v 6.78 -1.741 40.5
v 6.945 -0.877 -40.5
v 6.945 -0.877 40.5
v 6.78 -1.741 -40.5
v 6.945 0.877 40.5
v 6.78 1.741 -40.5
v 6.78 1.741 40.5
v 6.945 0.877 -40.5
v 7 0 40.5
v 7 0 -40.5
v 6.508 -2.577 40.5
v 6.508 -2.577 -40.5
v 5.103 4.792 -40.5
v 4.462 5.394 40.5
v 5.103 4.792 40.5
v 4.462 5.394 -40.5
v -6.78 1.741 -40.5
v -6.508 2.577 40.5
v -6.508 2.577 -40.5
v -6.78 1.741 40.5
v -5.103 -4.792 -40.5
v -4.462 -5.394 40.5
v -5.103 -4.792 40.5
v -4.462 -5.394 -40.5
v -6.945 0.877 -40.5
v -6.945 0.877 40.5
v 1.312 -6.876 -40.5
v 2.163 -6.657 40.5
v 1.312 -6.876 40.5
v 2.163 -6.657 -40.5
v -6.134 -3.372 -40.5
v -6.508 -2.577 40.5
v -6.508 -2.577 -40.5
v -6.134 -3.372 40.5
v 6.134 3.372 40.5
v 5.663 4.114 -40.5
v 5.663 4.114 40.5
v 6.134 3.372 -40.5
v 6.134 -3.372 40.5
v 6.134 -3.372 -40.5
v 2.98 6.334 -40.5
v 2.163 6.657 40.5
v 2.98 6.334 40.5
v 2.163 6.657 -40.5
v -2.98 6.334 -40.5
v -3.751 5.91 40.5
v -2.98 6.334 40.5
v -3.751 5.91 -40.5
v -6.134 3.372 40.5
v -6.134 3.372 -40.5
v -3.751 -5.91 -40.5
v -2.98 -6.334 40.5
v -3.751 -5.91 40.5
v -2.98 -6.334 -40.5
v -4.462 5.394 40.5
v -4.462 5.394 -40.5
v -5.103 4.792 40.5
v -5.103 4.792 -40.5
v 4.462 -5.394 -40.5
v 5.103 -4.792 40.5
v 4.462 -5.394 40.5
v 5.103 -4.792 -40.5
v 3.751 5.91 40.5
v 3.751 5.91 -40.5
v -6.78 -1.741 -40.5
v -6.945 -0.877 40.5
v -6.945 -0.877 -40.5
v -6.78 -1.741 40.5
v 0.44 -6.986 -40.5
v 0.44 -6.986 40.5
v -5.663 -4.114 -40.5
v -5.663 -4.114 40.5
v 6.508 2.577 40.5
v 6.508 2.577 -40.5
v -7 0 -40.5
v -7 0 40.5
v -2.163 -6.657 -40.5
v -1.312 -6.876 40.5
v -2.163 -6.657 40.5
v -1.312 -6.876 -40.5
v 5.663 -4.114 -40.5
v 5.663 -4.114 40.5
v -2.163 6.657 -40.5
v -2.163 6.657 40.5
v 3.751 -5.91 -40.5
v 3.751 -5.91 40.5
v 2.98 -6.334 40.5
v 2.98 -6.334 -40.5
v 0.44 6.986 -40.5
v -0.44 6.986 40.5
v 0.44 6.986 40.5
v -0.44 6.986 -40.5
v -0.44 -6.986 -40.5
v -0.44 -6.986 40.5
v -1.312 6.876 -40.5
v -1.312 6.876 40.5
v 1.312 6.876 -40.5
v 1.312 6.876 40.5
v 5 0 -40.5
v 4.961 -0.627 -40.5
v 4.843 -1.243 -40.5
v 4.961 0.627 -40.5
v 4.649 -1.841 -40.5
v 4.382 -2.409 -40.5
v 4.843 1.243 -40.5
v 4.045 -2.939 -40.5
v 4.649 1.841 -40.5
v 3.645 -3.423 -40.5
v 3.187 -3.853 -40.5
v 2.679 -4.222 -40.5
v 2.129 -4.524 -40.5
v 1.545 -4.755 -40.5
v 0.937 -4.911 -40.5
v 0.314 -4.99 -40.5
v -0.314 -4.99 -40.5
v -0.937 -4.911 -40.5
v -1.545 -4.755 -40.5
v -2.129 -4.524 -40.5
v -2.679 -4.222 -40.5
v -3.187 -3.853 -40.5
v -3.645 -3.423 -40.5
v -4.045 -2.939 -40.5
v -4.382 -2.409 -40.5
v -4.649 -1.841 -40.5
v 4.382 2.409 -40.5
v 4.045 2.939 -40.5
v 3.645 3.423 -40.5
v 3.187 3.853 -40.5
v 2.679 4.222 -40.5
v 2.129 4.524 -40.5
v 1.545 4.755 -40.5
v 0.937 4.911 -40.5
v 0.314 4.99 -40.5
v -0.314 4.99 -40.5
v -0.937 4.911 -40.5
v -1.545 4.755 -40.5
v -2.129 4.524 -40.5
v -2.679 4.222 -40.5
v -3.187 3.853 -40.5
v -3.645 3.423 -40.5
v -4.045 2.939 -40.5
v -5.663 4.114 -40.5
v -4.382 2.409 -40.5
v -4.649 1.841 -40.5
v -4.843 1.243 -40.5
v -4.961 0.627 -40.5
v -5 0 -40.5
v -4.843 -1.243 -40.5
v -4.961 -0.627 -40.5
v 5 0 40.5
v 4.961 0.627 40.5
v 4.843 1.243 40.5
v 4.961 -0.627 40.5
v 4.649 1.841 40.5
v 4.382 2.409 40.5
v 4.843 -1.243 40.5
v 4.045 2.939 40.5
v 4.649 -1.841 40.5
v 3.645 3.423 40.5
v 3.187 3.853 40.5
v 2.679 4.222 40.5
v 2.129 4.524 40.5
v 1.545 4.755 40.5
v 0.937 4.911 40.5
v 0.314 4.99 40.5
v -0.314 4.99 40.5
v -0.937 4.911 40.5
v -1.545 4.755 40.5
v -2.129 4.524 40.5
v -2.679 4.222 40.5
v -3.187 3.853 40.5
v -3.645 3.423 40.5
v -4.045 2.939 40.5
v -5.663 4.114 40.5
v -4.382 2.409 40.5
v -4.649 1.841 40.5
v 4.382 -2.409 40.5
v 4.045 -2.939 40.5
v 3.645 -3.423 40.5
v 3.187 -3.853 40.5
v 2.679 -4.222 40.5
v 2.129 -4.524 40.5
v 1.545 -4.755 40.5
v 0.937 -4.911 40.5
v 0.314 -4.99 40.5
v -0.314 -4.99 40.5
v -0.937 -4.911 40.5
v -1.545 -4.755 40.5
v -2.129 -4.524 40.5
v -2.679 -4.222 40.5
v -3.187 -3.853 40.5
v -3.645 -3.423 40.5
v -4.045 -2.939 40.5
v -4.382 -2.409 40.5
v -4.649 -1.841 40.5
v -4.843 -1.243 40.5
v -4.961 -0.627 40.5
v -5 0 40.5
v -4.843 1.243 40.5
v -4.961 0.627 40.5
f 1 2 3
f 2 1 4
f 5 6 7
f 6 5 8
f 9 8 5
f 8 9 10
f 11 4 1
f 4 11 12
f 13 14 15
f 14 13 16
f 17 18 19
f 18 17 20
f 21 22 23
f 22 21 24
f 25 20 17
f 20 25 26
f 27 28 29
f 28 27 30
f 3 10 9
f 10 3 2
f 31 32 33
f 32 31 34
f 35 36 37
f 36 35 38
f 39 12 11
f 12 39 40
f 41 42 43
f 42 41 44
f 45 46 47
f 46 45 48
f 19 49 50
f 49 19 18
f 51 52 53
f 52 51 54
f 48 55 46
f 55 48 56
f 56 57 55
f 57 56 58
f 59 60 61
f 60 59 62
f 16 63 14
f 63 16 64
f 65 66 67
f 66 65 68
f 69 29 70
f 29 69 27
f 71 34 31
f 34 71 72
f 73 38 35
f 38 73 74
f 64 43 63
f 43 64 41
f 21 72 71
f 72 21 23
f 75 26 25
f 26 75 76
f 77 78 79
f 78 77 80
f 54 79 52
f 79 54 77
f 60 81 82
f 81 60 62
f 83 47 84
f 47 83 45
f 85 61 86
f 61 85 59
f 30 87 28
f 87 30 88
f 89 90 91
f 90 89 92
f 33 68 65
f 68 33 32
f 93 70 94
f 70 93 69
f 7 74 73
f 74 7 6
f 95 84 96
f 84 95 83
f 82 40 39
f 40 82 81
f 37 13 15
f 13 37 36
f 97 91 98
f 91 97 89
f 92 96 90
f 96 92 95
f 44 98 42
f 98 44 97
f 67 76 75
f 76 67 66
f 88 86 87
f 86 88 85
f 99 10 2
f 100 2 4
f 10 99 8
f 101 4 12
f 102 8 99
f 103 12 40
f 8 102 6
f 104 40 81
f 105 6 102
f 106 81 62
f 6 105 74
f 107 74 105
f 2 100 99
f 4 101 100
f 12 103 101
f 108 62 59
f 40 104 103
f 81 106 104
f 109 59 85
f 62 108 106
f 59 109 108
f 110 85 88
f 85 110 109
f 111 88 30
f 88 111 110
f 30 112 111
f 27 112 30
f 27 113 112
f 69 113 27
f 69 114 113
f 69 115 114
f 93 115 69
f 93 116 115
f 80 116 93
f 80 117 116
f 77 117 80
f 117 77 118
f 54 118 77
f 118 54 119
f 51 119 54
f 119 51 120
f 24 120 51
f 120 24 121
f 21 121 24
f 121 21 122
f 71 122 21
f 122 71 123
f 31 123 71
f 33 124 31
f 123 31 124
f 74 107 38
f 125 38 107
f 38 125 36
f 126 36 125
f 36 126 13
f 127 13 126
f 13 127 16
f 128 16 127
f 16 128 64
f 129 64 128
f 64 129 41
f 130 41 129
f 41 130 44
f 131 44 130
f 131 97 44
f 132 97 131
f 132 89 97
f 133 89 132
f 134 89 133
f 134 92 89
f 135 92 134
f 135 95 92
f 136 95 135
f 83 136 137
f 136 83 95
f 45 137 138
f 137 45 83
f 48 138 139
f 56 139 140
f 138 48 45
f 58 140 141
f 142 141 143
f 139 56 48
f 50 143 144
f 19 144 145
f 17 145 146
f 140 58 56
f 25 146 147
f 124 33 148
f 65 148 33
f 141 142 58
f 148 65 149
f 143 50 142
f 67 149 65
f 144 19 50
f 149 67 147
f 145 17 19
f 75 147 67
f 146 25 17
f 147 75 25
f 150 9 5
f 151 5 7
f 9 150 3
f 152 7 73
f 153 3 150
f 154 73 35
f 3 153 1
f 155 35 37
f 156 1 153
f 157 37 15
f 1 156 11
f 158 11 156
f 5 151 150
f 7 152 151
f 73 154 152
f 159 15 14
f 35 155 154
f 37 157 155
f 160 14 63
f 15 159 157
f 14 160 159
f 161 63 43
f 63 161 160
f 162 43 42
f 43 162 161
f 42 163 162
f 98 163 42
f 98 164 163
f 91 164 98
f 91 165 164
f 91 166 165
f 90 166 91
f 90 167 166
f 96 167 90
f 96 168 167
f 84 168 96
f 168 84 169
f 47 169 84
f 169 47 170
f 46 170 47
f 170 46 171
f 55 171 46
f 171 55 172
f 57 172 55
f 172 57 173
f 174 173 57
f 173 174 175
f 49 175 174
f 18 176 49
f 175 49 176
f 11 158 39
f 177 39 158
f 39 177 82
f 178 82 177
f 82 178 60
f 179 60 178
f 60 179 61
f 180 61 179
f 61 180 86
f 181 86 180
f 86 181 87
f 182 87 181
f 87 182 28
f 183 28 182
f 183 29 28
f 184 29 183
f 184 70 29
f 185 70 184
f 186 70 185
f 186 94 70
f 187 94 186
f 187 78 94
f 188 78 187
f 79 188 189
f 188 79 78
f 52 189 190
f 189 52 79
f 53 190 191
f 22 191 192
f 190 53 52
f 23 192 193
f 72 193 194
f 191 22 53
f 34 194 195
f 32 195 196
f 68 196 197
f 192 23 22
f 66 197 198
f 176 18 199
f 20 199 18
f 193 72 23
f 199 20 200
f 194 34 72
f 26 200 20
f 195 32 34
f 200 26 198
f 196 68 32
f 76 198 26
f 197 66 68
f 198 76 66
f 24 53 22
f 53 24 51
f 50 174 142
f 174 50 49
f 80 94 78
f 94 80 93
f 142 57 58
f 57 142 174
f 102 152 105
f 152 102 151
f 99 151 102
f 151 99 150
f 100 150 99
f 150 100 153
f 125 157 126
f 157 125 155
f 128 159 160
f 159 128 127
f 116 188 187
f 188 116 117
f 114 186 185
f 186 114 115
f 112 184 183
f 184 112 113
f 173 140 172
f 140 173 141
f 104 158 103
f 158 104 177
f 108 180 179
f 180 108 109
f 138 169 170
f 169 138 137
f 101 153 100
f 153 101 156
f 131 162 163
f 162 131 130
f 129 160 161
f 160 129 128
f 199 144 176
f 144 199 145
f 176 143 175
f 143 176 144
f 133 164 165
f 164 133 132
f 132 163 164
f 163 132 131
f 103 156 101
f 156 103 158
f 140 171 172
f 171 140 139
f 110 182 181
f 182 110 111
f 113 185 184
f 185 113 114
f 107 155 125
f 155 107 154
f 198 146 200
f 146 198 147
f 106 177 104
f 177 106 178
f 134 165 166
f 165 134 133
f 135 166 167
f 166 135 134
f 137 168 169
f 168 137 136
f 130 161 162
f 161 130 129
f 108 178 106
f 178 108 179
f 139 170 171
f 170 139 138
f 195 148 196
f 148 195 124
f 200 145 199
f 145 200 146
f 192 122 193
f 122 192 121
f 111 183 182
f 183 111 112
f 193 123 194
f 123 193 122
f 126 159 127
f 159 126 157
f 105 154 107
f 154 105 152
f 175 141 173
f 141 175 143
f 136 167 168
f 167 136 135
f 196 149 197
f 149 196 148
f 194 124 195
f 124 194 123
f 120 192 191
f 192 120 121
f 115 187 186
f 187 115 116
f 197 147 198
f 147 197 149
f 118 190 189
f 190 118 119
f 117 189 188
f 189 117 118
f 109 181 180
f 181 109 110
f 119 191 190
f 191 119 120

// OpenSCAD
$fn = 50;


difference() {
	union() {
		translate(v = [0, 0, -40.5000000000]) {
			cylinder(h = 81, r = 7.0000000000);
		}
	}
	union() {
		translate(v = [0, 0, -100.0000000000]) {
			cylinder(h = 200, r = 5.0000000000);
		}
	}
}
